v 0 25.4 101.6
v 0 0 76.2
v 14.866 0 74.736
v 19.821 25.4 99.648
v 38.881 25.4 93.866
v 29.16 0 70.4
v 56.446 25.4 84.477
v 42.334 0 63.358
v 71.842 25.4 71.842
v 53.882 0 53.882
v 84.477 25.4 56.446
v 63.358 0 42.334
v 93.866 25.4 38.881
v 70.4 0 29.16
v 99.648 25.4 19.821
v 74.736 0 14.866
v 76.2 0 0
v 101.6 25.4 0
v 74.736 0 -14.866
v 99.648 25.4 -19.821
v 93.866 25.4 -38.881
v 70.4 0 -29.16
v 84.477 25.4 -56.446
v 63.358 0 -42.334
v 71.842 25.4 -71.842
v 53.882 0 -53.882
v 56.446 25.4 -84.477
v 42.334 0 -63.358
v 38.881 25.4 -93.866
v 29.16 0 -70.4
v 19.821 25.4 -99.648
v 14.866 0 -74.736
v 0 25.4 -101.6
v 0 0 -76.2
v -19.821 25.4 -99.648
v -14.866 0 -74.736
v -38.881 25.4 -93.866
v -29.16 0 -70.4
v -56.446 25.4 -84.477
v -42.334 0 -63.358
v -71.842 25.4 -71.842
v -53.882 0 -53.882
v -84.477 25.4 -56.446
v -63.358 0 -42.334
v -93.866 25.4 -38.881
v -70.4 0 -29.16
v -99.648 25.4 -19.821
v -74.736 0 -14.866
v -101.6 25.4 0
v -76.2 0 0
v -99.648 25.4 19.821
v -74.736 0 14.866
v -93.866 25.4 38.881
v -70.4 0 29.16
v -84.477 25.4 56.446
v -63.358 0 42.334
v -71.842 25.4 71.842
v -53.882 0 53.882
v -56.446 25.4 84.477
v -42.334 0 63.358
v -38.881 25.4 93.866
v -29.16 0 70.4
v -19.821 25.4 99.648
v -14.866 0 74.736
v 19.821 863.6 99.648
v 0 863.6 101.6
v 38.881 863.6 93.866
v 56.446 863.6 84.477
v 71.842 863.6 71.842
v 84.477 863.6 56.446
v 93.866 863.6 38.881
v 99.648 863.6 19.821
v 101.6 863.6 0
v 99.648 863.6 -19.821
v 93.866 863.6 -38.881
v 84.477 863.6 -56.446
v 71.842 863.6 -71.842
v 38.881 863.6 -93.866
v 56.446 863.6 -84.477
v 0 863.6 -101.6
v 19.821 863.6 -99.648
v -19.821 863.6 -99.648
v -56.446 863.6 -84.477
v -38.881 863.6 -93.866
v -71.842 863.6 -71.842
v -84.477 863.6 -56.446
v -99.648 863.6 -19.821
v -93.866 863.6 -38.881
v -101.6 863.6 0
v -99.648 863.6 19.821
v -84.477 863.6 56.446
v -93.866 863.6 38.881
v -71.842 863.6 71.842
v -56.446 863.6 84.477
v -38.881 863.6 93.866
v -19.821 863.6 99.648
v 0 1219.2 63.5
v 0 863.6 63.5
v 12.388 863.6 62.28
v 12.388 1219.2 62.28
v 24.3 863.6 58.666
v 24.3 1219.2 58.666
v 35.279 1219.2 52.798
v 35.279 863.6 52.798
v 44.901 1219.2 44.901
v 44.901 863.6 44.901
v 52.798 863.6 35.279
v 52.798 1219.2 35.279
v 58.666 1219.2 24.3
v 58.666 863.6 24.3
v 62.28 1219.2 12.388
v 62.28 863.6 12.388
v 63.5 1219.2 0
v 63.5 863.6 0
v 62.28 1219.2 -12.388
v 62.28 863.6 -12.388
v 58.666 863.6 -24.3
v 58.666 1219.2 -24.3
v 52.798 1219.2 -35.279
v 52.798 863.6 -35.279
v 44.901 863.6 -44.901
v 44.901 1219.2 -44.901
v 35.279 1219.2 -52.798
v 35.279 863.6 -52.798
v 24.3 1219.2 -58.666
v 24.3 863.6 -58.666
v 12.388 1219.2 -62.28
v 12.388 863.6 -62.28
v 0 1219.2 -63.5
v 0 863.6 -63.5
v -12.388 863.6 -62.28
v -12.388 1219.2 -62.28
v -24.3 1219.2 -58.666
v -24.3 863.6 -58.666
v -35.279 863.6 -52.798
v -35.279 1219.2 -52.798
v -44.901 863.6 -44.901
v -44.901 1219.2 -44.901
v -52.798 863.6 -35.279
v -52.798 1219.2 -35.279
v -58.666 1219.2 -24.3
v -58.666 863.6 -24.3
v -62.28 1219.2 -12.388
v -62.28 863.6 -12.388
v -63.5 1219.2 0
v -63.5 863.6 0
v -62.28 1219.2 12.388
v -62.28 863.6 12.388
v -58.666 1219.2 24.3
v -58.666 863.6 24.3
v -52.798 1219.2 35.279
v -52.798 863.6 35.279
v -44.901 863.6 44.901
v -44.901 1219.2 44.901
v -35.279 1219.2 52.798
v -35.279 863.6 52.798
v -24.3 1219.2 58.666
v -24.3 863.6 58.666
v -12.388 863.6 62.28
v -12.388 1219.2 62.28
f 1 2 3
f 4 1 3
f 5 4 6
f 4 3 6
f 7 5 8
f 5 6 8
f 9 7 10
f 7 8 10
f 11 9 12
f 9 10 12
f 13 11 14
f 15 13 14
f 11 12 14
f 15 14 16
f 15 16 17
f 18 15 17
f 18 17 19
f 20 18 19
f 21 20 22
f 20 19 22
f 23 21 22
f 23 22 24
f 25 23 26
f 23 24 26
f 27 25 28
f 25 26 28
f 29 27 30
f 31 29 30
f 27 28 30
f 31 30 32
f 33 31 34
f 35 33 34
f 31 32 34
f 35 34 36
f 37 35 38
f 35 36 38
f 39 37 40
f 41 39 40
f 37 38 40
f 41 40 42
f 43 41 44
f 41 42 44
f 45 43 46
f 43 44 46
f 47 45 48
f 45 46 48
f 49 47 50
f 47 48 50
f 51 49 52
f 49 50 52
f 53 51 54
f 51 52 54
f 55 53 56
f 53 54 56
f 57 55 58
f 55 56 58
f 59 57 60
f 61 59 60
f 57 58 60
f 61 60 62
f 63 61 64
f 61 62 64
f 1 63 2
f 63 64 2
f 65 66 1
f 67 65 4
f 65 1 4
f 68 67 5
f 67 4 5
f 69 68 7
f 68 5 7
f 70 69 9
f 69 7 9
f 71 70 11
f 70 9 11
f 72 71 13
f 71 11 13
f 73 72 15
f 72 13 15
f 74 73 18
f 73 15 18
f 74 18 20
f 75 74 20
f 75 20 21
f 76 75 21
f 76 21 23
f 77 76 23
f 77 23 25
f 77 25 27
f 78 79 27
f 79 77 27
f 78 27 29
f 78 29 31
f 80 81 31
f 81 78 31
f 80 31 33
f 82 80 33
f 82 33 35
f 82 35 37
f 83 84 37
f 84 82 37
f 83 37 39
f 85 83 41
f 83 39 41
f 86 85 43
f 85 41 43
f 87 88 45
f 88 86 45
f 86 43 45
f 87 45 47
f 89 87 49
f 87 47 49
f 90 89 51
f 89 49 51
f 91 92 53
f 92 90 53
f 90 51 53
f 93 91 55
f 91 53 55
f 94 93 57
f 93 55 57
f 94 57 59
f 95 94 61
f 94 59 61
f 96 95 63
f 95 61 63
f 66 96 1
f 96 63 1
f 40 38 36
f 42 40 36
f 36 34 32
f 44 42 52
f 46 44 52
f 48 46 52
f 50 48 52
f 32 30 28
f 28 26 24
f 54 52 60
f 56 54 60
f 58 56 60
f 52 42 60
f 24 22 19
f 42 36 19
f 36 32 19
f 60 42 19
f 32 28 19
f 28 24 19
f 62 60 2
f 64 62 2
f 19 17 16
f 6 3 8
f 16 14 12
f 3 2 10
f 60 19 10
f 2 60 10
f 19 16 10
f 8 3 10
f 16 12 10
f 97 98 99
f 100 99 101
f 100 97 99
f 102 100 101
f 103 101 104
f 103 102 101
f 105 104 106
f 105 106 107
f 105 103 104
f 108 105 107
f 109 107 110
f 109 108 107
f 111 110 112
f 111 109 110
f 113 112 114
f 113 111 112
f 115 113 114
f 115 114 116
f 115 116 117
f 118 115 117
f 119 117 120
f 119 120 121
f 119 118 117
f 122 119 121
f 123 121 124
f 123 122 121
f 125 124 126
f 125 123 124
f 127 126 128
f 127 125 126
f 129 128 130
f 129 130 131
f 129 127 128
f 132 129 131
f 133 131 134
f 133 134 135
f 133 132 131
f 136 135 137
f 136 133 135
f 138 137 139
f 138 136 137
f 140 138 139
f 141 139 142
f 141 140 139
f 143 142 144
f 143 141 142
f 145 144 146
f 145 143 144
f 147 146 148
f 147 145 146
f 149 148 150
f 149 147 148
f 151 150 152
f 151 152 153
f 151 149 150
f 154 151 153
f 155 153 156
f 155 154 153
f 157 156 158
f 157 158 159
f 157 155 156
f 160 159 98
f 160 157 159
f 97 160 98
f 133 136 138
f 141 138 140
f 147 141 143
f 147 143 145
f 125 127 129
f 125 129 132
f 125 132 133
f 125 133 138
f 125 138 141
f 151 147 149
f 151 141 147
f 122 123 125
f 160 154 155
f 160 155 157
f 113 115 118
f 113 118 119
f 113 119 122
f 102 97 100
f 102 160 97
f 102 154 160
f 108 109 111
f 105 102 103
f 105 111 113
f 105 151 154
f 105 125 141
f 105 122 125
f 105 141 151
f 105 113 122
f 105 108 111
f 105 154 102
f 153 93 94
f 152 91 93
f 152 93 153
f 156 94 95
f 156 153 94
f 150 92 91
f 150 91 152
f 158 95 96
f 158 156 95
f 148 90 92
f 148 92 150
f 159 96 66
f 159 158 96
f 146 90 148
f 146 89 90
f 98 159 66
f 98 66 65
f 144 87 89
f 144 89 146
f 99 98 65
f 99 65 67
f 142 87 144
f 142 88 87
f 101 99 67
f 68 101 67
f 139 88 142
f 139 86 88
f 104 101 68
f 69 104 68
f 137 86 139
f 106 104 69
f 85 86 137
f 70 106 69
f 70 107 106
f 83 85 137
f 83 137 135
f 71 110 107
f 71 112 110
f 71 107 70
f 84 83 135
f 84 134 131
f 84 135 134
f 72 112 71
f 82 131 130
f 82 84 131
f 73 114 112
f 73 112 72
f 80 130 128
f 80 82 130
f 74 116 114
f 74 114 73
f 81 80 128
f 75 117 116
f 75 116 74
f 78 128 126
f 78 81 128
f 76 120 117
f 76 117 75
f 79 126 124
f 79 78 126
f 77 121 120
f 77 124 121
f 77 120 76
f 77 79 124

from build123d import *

# Parameters (mm, degrees)
SKETCH1_R           = 101.6
BOSS_EXTRUDE1_DEPTH = 1219.2
SKETCH2_OUTSIDE_W   = 455.722
SKETCH2_OUTSIDE_H   = 455.722
SKETCH2_OUTSIDE_R   = 63.5
CUT_EXTRUDE1_DEPTH  = 355.6
CHAMFER1_SIZE       = 25.4


with BuildPart() as part:
    # Sketch1 → Boss-Extrude1 (new body)
    with BuildSketch(Plane(origin=(0, 0, 0), x_dir=(1, 0, 0), z_dir=(0, 1, 0))):
        with Locations(Location((0, 0, 0), (0, 0, 270))):  # turned: the seam where the file's is
            Circle(SKETCH1_R)
    extrude(amount=BOSS_EXTRUDE1_DEPTH)

    # Sketch2 outside → Cut-Extrude1 (cut)
    with BuildSketch(Plane(origin=(0, 1219.2, 0), x_dir=(1, 0, 0), z_dir=(0, 1, 0))):
        Rectangle(SKETCH2_OUTSIDE_W, SKETCH2_OUTSIDE_H)
        with Locations(Location((0, 0, 0), (0, 0, 270))):  # turned: the seam where the file's is
            Circle(SKETCH2_OUTSIDE_R, mode=Mode.SUBTRACT)
    extrude(amount=-CUT_EXTRUDE1_DEPTH, mode=Mode.SUBTRACT)

    # Chamfer1
    chamfer1_edges = [part.edges().sort_by_distance(p)[0] for p in [
        (0, 0, -101.6),
    ]]
    chamfer(chamfer1_edges, length=CHAMFER1_SIZE)


solid = part.part
